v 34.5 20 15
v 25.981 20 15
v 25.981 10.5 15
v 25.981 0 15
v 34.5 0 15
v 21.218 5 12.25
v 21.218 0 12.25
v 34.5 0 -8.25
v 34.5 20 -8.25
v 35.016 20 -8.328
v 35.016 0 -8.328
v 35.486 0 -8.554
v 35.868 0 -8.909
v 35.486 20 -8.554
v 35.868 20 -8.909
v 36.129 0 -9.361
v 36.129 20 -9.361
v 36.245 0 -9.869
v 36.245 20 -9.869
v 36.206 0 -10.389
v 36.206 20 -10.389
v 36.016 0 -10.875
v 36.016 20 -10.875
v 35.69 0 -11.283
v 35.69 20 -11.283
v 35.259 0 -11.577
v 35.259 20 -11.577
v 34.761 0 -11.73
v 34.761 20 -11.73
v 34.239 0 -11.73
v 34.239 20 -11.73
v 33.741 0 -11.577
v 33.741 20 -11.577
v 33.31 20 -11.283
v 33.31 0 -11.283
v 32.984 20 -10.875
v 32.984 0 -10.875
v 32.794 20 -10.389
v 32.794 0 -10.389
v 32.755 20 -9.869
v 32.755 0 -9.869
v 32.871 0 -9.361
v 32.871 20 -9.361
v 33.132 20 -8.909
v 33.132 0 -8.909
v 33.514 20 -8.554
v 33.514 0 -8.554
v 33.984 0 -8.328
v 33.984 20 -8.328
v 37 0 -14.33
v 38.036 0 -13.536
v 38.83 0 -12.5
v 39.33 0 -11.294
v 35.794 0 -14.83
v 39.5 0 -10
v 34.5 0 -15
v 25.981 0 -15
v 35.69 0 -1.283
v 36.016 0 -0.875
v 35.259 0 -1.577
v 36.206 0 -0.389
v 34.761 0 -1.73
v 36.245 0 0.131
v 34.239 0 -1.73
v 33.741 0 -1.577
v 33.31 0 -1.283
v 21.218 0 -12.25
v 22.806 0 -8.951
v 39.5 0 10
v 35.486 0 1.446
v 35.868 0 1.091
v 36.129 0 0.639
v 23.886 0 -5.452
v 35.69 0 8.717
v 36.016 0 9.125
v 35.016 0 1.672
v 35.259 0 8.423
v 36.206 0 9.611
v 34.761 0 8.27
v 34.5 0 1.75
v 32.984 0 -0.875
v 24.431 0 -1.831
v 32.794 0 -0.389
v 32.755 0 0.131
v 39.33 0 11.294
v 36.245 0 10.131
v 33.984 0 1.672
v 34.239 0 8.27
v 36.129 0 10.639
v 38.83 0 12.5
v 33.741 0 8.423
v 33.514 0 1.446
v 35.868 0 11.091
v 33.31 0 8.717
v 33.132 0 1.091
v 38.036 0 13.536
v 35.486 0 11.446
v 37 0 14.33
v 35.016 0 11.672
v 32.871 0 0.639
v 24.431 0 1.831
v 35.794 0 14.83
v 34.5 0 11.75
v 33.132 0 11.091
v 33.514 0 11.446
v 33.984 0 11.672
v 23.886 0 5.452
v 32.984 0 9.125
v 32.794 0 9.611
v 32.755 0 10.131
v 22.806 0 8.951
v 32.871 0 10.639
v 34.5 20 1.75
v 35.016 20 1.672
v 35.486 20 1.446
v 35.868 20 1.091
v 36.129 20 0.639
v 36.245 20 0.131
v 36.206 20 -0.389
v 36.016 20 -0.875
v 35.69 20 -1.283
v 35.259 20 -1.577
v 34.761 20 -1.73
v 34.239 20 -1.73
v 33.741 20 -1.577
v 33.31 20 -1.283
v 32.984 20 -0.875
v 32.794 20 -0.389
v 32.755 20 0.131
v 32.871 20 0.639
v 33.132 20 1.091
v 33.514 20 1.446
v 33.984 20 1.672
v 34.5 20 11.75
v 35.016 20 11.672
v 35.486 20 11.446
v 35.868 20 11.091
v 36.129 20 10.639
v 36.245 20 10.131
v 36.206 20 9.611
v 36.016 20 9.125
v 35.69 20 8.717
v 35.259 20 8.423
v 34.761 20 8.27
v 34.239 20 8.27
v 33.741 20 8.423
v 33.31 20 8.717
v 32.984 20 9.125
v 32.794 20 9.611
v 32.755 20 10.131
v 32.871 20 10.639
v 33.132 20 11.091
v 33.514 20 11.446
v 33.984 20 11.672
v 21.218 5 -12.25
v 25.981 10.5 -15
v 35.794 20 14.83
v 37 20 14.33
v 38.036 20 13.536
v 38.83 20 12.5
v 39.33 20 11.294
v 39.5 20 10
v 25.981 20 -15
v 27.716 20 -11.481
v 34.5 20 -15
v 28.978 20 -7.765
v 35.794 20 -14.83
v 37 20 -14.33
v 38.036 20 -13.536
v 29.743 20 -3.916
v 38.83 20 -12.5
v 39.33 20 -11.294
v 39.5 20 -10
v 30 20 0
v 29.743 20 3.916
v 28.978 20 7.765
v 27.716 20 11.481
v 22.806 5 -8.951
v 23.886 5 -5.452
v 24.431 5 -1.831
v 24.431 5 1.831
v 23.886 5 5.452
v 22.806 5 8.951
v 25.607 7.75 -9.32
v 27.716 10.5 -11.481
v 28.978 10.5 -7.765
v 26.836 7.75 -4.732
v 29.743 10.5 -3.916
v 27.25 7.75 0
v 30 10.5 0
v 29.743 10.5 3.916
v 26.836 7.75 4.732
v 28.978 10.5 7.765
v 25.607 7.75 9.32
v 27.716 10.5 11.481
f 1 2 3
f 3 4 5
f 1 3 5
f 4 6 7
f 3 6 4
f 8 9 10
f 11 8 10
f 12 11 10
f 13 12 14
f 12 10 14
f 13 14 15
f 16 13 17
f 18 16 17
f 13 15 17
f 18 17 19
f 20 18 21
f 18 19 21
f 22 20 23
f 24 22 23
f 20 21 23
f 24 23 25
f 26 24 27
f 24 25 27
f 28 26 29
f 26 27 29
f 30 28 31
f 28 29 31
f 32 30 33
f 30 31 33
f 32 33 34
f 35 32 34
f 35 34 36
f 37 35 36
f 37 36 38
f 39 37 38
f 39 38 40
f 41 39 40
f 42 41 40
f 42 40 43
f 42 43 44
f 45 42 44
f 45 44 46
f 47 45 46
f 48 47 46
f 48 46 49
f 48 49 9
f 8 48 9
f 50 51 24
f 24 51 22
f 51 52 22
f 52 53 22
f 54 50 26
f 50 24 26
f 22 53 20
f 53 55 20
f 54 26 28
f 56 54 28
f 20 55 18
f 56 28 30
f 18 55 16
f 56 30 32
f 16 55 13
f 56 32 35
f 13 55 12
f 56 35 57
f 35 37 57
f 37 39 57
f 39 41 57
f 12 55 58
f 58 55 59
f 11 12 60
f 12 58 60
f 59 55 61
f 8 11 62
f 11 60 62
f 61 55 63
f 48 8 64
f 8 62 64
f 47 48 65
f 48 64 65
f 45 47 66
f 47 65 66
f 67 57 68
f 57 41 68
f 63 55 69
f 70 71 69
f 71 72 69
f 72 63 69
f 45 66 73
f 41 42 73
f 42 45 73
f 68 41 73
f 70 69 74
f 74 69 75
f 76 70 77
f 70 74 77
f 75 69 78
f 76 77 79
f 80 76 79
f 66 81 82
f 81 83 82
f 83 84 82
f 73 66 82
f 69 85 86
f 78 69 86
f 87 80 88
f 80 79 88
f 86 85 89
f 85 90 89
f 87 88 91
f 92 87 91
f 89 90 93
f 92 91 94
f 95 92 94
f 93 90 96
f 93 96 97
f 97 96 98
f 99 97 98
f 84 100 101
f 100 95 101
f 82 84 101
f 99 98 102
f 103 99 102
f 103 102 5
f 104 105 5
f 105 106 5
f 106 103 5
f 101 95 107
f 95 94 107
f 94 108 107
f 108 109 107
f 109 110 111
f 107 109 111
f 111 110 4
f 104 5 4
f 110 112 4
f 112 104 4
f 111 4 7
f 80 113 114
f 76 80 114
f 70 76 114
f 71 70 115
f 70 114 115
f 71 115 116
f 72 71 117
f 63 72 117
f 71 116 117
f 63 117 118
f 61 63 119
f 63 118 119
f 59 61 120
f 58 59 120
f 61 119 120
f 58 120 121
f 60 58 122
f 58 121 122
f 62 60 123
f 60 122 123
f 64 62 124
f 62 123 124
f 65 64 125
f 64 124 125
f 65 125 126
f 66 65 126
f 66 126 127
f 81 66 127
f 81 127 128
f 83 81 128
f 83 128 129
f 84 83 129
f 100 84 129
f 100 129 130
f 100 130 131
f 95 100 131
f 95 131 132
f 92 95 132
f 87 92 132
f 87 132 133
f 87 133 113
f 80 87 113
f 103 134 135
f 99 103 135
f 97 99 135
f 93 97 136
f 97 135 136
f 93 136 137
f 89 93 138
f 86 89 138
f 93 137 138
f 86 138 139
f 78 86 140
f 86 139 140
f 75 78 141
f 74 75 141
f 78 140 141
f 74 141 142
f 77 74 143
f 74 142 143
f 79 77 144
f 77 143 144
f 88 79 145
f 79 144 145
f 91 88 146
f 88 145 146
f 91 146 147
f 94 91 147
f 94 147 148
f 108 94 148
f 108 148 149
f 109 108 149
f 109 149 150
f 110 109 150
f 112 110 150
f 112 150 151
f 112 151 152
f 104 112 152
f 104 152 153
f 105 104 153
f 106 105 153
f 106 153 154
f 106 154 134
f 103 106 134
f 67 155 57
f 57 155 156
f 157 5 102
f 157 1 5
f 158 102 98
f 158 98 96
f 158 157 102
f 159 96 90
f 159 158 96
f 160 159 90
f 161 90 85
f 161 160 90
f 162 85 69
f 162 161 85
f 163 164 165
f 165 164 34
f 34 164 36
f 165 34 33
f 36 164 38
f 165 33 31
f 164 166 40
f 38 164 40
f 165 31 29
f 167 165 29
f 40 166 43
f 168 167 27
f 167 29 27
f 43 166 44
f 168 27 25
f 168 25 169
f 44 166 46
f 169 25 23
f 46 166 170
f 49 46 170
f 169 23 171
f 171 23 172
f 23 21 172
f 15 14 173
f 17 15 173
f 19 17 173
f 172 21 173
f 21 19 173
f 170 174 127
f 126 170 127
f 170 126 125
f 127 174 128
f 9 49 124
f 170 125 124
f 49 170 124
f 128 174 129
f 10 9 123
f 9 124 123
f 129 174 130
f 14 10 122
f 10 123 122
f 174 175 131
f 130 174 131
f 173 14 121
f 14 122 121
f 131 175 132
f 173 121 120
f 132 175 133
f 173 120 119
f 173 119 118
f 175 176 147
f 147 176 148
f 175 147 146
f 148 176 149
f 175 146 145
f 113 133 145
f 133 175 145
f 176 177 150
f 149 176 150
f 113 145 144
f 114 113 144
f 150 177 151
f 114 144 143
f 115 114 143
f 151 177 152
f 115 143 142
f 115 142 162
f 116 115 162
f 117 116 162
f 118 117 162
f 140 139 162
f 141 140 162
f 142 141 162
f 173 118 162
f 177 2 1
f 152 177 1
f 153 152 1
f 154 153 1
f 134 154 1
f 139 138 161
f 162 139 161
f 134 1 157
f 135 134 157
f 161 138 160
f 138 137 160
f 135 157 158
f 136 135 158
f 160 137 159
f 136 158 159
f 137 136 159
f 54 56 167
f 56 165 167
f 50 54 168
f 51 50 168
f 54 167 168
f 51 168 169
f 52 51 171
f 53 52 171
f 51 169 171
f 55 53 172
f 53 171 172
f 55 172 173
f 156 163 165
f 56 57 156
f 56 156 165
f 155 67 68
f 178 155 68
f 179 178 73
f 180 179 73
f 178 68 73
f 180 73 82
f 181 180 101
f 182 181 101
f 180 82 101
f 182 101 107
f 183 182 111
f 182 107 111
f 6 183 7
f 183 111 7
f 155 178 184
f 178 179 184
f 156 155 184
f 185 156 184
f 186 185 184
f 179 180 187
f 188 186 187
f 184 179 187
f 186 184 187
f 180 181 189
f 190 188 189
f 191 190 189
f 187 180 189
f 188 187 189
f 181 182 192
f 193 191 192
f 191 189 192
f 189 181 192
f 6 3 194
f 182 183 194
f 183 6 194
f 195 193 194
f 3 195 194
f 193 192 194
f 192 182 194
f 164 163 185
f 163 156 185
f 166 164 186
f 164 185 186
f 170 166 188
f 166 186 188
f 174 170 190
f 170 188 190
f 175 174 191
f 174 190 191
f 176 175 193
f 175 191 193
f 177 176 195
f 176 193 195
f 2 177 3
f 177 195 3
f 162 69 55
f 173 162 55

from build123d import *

# Parameters (mm, degrees)
REVOLVE1_ANGLE      = 60
SKETCH2_OUTSIDE_W   = 36.094
SKETCH2_OUTSIDE_H   = 57.312
SKETCH2_OUTSIDE_W_2 = 27.637577589
SKETCH2_OUTSIDE_H_2 = 30
CUT_EXTRUDE2_DEPTH  = 40
FILLET1_R           = 5
SKETCH3_R           = 1.75
CUT_EXTRUDE3_DEPTH  = 40


with BuildPart() as part:
    # Sketch1 → Revolve1 (revolve, symmetric)
    with BuildSketch(Plane.XY) as revolve1_sk:
        Polygon((30, 20), (30, 10.5), (24.5, 5), (24.5, 0), (44.5, 0), (44.5, 20), align=None)
    revolve(axis=Axis((0, 0, 0), (0, 1, 0)), revolution_arc=REVOLVE1_ANGLE / 2)
    revolve(revolve1_sk.sketch, axis=Axis((0, 0, 0), (0, -1, 0)), revolution_arc=REVOLVE1_ANGLE / 2)

    # Sketch2 outside → Cut-Extrude2 (cut)
    with BuildSketch(Plane(origin=(0, 0, 0), x_dir=(1, 0, 0), z_dir=(0, 1, 0))):
        with Locations((32.859, 0)):
            Rectangle(SKETCH2_OUTSIDE_W, SKETCH2_OUTSIDE_H)
        with Locations((25.681211205, 0)):
            Rectangle(SKETCH2_OUTSIDE_W_2, SKETCH2_OUTSIDE_H_2, mode=Mode.SUBTRACT)
    extrude(amount=CUT_EXTRUDE2_DEPTH, mode=Mode.SUBTRACT)

    # Fillet1
    fillet1_edges = [part.edges().sort_by_distance(p)[0] for p in [
        (39.5, 10, -15),
        (39.5, 10, 15),
    ]]
    fillet(fillet1_edges, radius=FILLET1_R)

    # Sketch3 → Cut-Extrude3 (cut)
    with BuildSketch(Plane(origin=(0, 20, 0), x_dir=(1, 0, 0), z_dir=(0, 1, 0))):
        with Locations(Location((34.5, -10, 0), (0, 0, 270))):
            Circle(SKETCH3_R)
        with Locations(Location((34.5, 10, 0), (0, 0, 270))):
            Circle(SKETCH3_R)
        with Locations(Location((34.5, 0, 0), (0, 0, 270))):
            Circle(SKETCH3_R)
    extrude(amount=-CUT_EXTRUDE3_DEPTH, mode=Mode.SUBTRACT)


solid = part.part
